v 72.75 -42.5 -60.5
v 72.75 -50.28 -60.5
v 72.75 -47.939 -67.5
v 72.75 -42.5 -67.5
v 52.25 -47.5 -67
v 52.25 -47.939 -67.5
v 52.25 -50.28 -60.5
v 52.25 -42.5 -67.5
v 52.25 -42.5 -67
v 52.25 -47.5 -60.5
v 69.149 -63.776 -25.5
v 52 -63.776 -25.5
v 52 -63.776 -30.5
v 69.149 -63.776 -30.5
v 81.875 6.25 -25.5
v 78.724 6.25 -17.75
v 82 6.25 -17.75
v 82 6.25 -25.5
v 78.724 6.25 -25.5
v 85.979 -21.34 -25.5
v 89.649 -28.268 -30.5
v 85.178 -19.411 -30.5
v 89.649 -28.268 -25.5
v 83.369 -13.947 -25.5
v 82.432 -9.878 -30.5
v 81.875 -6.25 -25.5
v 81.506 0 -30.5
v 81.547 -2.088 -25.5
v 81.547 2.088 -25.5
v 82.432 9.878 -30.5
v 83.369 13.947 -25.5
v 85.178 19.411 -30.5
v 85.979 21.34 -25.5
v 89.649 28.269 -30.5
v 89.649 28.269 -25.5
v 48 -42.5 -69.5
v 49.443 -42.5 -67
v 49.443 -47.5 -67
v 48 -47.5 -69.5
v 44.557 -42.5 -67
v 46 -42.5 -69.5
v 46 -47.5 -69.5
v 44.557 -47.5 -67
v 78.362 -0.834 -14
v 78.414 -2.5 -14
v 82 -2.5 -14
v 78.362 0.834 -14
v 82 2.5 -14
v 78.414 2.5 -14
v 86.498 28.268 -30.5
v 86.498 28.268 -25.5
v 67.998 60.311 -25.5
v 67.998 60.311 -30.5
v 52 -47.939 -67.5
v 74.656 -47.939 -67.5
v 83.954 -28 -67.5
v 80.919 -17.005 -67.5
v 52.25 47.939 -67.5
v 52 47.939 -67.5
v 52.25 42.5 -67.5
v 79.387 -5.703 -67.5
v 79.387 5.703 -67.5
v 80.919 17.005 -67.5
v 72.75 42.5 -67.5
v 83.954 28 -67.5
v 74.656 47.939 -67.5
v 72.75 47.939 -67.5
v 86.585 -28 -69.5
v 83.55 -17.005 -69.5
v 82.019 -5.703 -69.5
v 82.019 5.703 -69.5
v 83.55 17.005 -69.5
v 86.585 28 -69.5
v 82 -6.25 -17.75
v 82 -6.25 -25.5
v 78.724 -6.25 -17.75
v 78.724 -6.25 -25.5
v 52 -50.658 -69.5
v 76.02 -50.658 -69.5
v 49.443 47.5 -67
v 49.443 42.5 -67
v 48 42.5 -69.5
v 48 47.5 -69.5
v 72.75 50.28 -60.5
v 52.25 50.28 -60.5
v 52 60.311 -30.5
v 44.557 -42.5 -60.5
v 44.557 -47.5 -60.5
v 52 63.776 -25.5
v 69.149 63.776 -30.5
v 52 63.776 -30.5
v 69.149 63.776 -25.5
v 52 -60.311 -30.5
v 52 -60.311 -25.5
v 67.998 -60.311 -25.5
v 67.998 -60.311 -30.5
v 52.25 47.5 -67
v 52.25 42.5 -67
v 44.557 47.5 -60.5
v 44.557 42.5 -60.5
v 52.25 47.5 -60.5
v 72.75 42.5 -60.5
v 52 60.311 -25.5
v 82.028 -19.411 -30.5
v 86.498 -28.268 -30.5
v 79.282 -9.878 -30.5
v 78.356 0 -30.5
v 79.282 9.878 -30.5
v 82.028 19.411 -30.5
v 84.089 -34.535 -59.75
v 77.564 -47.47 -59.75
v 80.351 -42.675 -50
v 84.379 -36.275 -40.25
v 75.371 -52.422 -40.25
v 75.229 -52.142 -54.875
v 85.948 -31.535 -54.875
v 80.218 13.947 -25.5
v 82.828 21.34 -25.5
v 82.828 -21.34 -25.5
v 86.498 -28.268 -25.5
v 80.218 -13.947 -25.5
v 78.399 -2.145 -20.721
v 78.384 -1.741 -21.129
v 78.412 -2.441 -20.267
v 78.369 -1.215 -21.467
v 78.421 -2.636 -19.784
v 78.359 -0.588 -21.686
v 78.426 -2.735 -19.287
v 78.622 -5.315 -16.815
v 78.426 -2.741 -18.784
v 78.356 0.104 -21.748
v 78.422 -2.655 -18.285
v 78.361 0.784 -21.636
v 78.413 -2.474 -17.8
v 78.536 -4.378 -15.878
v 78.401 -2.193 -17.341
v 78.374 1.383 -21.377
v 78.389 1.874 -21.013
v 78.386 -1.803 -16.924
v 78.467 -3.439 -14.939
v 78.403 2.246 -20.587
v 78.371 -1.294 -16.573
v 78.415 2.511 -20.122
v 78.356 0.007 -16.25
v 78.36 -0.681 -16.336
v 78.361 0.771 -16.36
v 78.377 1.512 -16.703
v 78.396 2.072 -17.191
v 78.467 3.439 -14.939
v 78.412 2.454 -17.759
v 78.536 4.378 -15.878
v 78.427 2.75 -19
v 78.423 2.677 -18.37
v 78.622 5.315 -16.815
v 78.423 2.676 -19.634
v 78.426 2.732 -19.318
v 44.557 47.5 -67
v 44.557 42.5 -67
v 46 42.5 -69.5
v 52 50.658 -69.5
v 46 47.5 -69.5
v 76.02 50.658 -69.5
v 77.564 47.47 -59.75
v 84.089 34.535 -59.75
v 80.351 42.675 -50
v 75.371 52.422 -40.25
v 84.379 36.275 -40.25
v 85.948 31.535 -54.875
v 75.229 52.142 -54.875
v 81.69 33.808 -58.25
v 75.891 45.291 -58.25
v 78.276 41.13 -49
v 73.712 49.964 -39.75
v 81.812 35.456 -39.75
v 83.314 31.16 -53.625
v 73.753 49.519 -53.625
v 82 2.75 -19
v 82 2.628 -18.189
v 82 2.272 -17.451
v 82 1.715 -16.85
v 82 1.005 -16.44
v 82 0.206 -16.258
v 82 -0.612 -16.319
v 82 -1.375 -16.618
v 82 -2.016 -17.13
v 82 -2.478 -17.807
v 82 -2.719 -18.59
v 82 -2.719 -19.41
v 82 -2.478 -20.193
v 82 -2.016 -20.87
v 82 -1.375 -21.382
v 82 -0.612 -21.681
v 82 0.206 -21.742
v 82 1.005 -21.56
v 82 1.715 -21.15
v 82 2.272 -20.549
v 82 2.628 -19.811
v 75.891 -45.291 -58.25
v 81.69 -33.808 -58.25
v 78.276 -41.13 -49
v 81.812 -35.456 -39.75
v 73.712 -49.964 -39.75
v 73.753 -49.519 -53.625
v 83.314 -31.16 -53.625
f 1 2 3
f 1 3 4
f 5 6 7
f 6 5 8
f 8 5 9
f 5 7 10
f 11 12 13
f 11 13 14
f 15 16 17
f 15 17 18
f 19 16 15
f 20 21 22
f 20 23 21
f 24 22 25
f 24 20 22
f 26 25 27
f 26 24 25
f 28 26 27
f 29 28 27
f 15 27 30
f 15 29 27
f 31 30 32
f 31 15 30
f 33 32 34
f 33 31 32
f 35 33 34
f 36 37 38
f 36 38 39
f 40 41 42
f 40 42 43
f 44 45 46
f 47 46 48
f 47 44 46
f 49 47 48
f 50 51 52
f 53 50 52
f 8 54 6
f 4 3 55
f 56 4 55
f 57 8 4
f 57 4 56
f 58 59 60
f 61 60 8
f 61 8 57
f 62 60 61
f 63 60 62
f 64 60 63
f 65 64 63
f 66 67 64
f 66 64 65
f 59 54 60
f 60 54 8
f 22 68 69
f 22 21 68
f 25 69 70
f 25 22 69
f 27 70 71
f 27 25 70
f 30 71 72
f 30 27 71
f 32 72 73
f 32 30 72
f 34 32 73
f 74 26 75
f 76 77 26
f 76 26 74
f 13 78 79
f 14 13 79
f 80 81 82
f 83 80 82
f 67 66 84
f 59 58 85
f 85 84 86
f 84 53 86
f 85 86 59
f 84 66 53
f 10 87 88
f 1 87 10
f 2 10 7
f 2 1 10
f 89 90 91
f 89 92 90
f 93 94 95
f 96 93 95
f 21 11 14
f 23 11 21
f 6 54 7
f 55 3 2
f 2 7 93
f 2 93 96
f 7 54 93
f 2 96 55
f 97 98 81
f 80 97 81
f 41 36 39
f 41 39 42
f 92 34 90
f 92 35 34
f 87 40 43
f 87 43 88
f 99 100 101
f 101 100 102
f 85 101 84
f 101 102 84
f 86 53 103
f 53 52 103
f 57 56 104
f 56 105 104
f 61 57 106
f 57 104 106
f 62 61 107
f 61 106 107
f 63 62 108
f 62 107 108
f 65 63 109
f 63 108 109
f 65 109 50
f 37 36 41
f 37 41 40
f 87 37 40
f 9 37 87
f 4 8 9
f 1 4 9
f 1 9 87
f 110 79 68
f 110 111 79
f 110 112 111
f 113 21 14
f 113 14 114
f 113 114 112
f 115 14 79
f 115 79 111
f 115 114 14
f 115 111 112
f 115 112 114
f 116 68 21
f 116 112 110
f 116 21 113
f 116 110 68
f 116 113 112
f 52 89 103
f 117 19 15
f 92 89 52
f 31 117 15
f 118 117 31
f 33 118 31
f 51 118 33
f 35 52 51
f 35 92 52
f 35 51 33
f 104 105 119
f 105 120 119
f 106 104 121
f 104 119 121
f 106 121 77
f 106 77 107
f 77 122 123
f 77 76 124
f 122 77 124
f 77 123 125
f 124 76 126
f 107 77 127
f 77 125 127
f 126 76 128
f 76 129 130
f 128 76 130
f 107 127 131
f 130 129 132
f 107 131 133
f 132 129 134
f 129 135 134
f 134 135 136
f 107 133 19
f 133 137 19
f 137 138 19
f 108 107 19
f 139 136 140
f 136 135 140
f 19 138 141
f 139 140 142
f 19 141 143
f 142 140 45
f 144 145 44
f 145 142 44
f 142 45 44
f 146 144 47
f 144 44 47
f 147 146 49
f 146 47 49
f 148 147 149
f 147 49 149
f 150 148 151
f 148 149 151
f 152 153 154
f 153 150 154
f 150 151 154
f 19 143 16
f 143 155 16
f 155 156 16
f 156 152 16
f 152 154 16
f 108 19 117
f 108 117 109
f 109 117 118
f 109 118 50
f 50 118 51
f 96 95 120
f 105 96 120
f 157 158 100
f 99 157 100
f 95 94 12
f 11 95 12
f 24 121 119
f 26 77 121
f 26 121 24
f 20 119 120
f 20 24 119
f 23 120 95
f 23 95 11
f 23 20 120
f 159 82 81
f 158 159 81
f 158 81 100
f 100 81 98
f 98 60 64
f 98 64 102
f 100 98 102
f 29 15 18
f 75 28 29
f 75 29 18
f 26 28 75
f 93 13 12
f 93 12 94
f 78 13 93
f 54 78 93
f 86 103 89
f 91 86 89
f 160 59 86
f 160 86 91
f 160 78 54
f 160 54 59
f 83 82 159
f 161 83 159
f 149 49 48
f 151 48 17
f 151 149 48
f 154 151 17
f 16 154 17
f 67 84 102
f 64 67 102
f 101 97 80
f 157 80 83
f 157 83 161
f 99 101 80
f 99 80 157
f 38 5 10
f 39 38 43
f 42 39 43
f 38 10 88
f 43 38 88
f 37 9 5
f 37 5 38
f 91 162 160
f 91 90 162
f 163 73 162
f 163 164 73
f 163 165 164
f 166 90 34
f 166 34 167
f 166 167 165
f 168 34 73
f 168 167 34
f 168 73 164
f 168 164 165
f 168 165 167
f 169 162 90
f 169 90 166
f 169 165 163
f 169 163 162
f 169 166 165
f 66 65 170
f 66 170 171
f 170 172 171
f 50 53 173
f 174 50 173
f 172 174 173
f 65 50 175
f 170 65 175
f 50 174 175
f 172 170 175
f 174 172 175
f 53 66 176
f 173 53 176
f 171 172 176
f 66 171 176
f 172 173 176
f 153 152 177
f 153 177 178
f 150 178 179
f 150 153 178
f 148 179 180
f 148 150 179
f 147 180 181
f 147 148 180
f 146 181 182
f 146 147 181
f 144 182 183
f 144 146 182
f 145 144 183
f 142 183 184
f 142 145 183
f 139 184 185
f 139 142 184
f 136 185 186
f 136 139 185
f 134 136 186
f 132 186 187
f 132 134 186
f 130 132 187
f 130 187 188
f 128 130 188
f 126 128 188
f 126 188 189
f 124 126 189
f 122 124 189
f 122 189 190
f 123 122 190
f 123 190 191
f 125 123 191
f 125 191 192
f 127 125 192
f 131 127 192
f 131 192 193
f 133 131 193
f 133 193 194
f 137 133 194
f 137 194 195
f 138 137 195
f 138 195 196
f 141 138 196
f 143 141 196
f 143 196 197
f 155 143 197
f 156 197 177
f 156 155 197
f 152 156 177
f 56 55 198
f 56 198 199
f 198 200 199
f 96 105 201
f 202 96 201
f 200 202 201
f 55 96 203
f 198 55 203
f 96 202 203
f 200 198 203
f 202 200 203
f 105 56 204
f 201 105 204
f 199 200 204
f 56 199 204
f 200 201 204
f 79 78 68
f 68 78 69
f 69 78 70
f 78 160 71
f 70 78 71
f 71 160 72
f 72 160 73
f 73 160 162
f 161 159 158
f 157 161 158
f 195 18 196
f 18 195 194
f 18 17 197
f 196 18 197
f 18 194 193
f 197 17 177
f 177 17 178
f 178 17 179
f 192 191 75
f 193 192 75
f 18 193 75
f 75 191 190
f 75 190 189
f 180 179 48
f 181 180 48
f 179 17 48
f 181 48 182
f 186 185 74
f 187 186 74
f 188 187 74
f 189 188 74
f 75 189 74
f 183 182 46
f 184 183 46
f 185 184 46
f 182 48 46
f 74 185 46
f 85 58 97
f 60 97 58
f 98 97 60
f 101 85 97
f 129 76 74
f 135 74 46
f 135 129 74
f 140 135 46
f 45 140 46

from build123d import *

# Parameters (mm, degrees)
EXTRUDE136140_DEPTH = 5
BOX017_W            = 41
BOX017_H            = 140
BOX017_DEPTH        = 60
SKETCH348_R         = 1.85
EXTRUDE136129_DEPTH = 25
EXTRUDE136133_DEPTH = 6
EXTRUDE136132_DEPTH = 6
SKETCH339_R         = 1.75
EXTRUDE136134_DEPTH = 14
EXTRUDE136135_DEPTH = 5
SKETCH349_R         = 2.85
EXTRUDE136130_DEPTH = 25
SKETCH353_R         = 2.75
EXTRUDE136137_DEPTH = 4
EXTRUDE136131_DEPTH = 116
EXTRUDE136138_DEPTH = 20.5
EXTRUDE136128_DEPTH = 8
EXTRUDE136127_DEPTH = 8
ARRAY032_COUNT      = 2
EXTRUDE136139_DEPTH = 5


with BuildPart() as extrude136140:
    # Sketch355 → Extrude136140 (new body)
    with BuildSketch(Plane.XZ):
        Polygon((0, 0), (-2, 0), (-3.443376, 2.5), (-3.443376, 9), (5.556624, 9), (5.556624, 2.5), (1.443376, 2.5), align=None)
    extrude(amount=-EXTRUDE136140_DEPTH)


with BuildPart() as extrude136140_1:
    # Extrude136140 placement: moved
    add(extrude136140.part.moved(Location((48, 42.5, -44))))


with BuildPart() as cube014:
    # Box017 → Box017 (new body)
    with BuildSketch(Plane(origin=(52, -70, -46), x_dir=(1, 0, 0), z_dir=(0, 0, 1))):
        with Locations((20.5, 70)):
            Rectangle(BOX017_W, BOX017_H)
    extrude(amount=BOX017_DEPTH)


with BuildPart() as extrude136129:
    # Sketch348 → Extrude136129 (new body)
    with BuildSketch(Plane.XY):
        with Locations((-40, 60)):
            Circle(SKETCH348_R)
        with Locations((40, 60)):
            Circle(SKETCH348_R)
        with Locations((40, -60)):
            Circle(SKETCH348_R)
        with Locations((-40, -60)):
            Circle(SKETCH348_R)
    extrude(amount=-EXTRUDE136129_DEPTH)


with BuildPart() as extrude136133:
    # Sketch351 → Extrude136133 (new body)
    with BuildSketch(Plane.XZ):
        Polygon((-4.05083, 4), (-1.25, 0), (1.25, 0), (4.05083, 4), align=None)
    extrude(amount=-EXTRUDE136133_DEPTH)


with BuildPart() as extrude136133_1:
    # Extrude136133 placement: moved
    add(extrude136133.part.moved(Location((0, 42, 0))))


with BuildPart() as fusion034004041077001011012:
    # Sketch351 → Extrude136132 (new body)
    with BuildSketch(Plane.XZ):
        Polygon((-4.05083, 4), (-1.25, 0), (1.25, 0), (4.05083, 4), align=None)
    extrude(amount=-EXTRUDE136132_DEPTH)


with BuildPart() as fusion034004041077001011012_1:
    # Extrude136132 placement: moved
    add(fusion034004041077001011012.part.moved(Location((0, -48, 0))))

    # Fusion034004041077001011012: union Extrude136133
    add(extrude136133_1.part)


with BuildPart() as fusion034004041077001011012_2:
    # Fusion034004041077001011012 placement: moved
    add(fusion034004041077001011012_1.part.moved(Location((47, 0, -44))))


with BuildPart() as extrude136134:
    # Sketch339 → Extrude136134 (new body)
    with BuildSketch(Plane.XY.offset(-32)):
        with Locations((-37.5, 46.5)):
            Circle(SKETCH339_R)
        with Locations((37.5, 46.5)):
            Circle(SKETCH339_R)
        with Locations((37.5, -46.5)):
            Circle(SKETCH339_R)
        with Locations((-37.5, -46.5)):
            Circle(SKETCH339_R)
    extrude(amount=-EXTRUDE136134_DEPTH)


with BuildPart() as extrude136135:
    # Sketch340 → Extrude136135 (new body)
    with BuildSketch(Plane.XY.offset(-39)):
        Polygon((39.125, -49.314583), (40.75, -46.5), (39.125, -43.685417), (35.875, -43.685417), (34.25, -46.5), (35.875, -49.314583), align=None)
        Polygon((39.125, 43.685417), (40.75, 46.5), (39.125, 49.314583), (35.875, 49.314583), (34.25, 46.5), (35.875, 43.685417), align=None)
        Polygon((-34.25, 46.5), (-35.875, 49.314583), (-39.125, 49.314583), (-40.75, 46.5), (-39.125, 43.685417), (-35.875, 43.685417), align=None)
        Polygon((-40.75, -46.5), (-39.125, -49.314583), (-35.875, -49.314583), (-34.25, -46.5), (-35.875, -43.685417), (-39.125, -43.685417), align=None)
    extrude(amount=EXTRUDE136135_DEPTH)


with BuildPart() as fusion034004041077001011011:
    # Sketch349 → Extrude136130 (new body)
    with BuildSketch(Plane.XY.offset(-8)):
        with Locations((-40, -60)):
            Circle(SKETCH349_R)
        with Locations((40, -60)):
            Circle(SKETCH349_R)
        with Locations((40, 60)):
            Circle(SKETCH349_R)
        with Locations((-40, 60)):
            Circle(SKETCH349_R)
    extrude(amount=-EXTRUDE136130_DEPTH)

    # Fusion034004041077001011011: union Extrude136129, Fusion034004041077001011012, Extrude136134, Extrude136135
    add(extrude136129.part)
    add(fusion034004041077001011012_2.part)
    add(extrude136134.part)
    add(extrude136135.part)


with BuildPart() as loft005:
    # Sketch344 → Loft005 section 0
    with BuildSketch(Plane.XY.offset(-42)):
        with BuildLine():
            Line((83.953856, 28), (74.656255, 47.938771))
            Line((-74.656255, 47.938771), (74.656255, 47.938771))
            Line((-74.656255, 47.938771), (-83.953856, 28))
            ThreePointArc((-83.953856, -28), (-79.195376, 0), (-83.953856, 28))
            Line((-83.953856, -28), (-74.656255, -47.938771))
            Line((-74.656255, -47.938771), (74.656255, -47.938771))
            Line((74.656255, -47.938771), (83.953856, -28))
            ThreePointArc((83.953856, 28), (79.195376, 0), (83.953856, -28))
        make_face()
    # Sketch345 → Loft005 section 1
    with BuildSketch(Plane.XY.offset(-5)):
        with BuildLine():
            Line((86.49793, 28.2685), (67.99793, 60.31144))
            Line((-67.99793, 60.31144), (67.99793, 60.31144))
            Line((-67.99793, 60.31144), (-86.49793, 28.2685))
            ThreePointArc((-86.49793, -28.2685), (-78.355592, 0), (-86.49793, 28.2685))
            Line((-86.49793, -28.2685), (-67.99793, -60.31144))
            Line((-67.99793, -60.31144), (67.99793, -60.31144))
            Line((67.99793, -60.31144), (86.49793, -28.2685))
            ThreePointArc((86.49793, 28.2685), (78.355592, 0), (86.49793, -28.2685))
        make_face()
    # Sketch343 → Loft005 section 2
    with BuildSketch(Plane.XY.offset(12)):
        with BuildLine():
            Line((86.49793, 28.2685), (67.99793, 60.31144))
            Line((-67.99793, 60.31144), (67.99793, 60.31144))
            Line((-67.99793, 60.31144), (-86.49793, 28.2685))
            ThreePointArc((-86.49793, -28.2685), (-78.355592, 0), (-86.49793, 28.2685))
            Line((-86.49793, -28.2685), (-67.99793, -60.31144))
            Line((-67.99793, -60.31144), (67.99793, -60.31144))
            Line((67.99793, -60.31144), (86.49793, -28.2685))
            ThreePointArc((86.49793, 28.2685), (78.355592, 0), (86.49793, -28.2685))
        make_face()
    loft(ruled=True)


with BuildPart() as extrude136137:
    # Sketch353 → Extrude136137 (new body)
    with BuildSketch(Plane.YZ):
        Polygon((-6.25, 0), (-6.25, 7.75), (-2.5, 11.5), (2.5, 11.5), (6.25, 7.75), (6.25, 0), align=None)
        with Locations((0, 6.5)):
            Circle(SKETCH353_R, mode=Mode.SUBTRACT)
    extrude(amount=EXTRUDE136137_DEPTH)


with BuildPart() as extrude136137_1:
    # Extrude136137 placement: moved
    add(extrude136137.part.moved(Location((78, 0, 0))))


with BuildPart() as cut009010006006006005025006:
    # Sketch342 → Loft006 section 0
    with BuildSketch(Plane.XY.offset(-44)):
        with BuildLine():
            Line((86.585218, 28), (76.019762, 50.657695))
            Line((-76.019762, 50.657695), (76.019762, 50.657695))
            Line((-76.019762, 50.657695), (-86.585218, 28))
            ThreePointArc((-86.585218, -28), (-81.826738, 0), (-86.585218, 28))
            Line((-86.585218, -28), (-76.019762, -50.657695))
            Line((-76.019762, -50.657695), (76.019762, -50.657695))
            Line((76.019762, -50.657695), (86.585218, -28))
            ThreePointArc((86.585218, 28), (81.826738, 0), (86.585218, -28))
        make_face()
    # Sketch346 → Loft006 section 1
    with BuildSketch(Plane.XY.offset(-5)):
        with BuildLine():
            Line((89.648714, 28.2685), (69.148714, 63.775542))
            Line((-69.148714, 63.775542), (69.148714, 63.775542))
            Line((-69.148714, 63.775542), (-89.648714, 28.2685))
            ThreePointArc((-89.648714, -28.2685), (-81.506376, 0), (-89.648714, 28.2685))
            Line((-89.648714, -28.2685), (-69.148714, -63.775542))
            Line((-69.148714, -63.775542), (69.148714, -63.775542))
            Line((69.148714, -63.775542), (89.648714, -28.2685))
            ThreePointArc((89.648714, 28.2685), (81.506376, 0), (89.648714, -28.2685))
        make_face()
    # Sketch341 → Loft006 section 2
    with BuildSketch(Plane.XY):
        with BuildLine():
            Line((89.648714, 28.2685), (69.148714, 63.775542))
            Line((-69.148714, 63.775542), (69.148714, 63.775542))
            Line((-69.148714, 63.775542), (-89.648714, 28.2685))
            ThreePointArc((-89.648714, -28.2685), (-81.506376, 0), (-89.648714, 28.2685))
            Line((-89.648714, -28.2685), (-69.148714, -63.775542))
            Line((-69.148714, -63.775542), (69.148714, -63.775542))
            Line((69.148714, -63.775542), (89.648714, -28.2685))
            ThreePointArc((89.648714, 28.2685), (81.506376, 0), (89.648714, -28.2685))
        make_face()
    loft(ruled=True)

    # Fusion034004041077001011013: union Extrude136137
    add(extrude136137_1.part)

    # Cut009010006006006005025006: cut Loft005
    add(loft005.part, mode=Mode.SUBTRACT)


with BuildPart() as extrude136131:
    # Sketch350 → Extrude136131 (new body)
    with BuildSketch(Plane.YZ):
        Polygon((-52.764154, 0), (-49.5, -7), (-42.5, -7), (-42.5, 0), align=None)
        Polygon((52.764154, 0), (49.5, -7), (42.5, -7), (42.5, 0), align=None)
        Polygon((-26, 0), (-23, 0), (-23, -7), (-30.041452, -7), align=None)
        Polygon((23, 0), (26, 0), (30.041452, -7), (23, -7), align=None)
    extrude(amount=EXTRUDE136131_DEPTH)


with BuildPart() as extrude136131_1:
    # Extrude136131 placement: moved
    add(extrude136131.part.moved(Location((-72.85, 0, -35))))


with BuildPart() as extrude136138:
    # Sketch354 → Extrude136138 (new body)
    with BuildSketch(Plane.YZ):
        Polygon((-52.764154, 0), (-49.5, -7), (-42.5, -7), (-42.5, 0), align=None)
        Polygon((52.764154, 0), (49.5, -7), (42.5, -7), (42.5, 0), align=None)
    extrude(amount=-EXTRUDE136138_DEPTH)


with BuildPart() as extrude136138_1:
    # Extrude136138 placement: moved
    add(extrude136138.part.moved(Location((72.75, 0, -35))))


with BuildPart() as extrude136128:
    # Sketch347 → Extrude136128 (new body)
    with BuildSketch(Plane.YZ):
        Polygon((0, 0), (0, -5), (7, -17.124356), (7, 0), align=None)
    extrude(amount=EXTRUDE136128_DEPTH)


with BuildPart() as extrude136128_1:
    # Extrude136128 placement: moved
    add(extrude136128.part.moved(Location((-44, -63, 0))))


with BuildPart() as common001:
    # Sketch347 → Extrude136127 (new body)
    with BuildSketch(Plane.YZ):
        Polygon((0, 0), (0, -5), (7, -17.124356), (7, 0), align=None)
    extrude(amount=EXTRUDE136127_DEPTH)


with BuildPart() as common001_1:
    # Extrude136127 placement: moved
    add(common001.part.moved(Location((36, -63, 0))))

    # Fusion034004041077001011010: union Extrude136128
    add(extrude136128_1.part)

    # Array032: Common001 ×2 about axis
    array032_axis = Axis((0, 0, 0), (0, 0, 1))


with BuildPart() as common001_2:
    add(common001_1.part)
    for i in range(1, ARRAY032_COUNT):
        add(common001_1.part.rotate(array032_axis, i * 360 / ARRAY032_COUNT))

    # Fusion034004041077001011014: union Cut009010006006006005025006, Extrude136131, Extrude136138
    add(cut009010006006006005025006.part)
    add(extrude136131_1.part)
    add(extrude136138_1.part)

    # Cut009010006006006005025007: cut Fusion034004041077001011011
    add(fusion034004041077001011011.part, mode=Mode.SUBTRACT)

    # Common001: intersect Cube014
    add(cube014.part, mode=Mode.INTERSECT)


with BuildPart() as batterycoverfusion44mm:
    # Sketch355 → Extrude136139 (new body)
    with BuildSketch(Plane.XZ):
        Polygon((0, 0), (-2, 0), (-3.443376, 2.5), (-3.443376, 9), (5.556624, 9), (5.556624, 2.5), (1.443376, 2.5), align=None)
    extrude(amount=EXTRUDE136139_DEPTH)


with BuildPart() as batterycoverfusion44mm_1:
    # Extrude136139 placement: moved
    add(batterycoverfusion44mm.part.moved(Location((48, -42.5, -44))))

    # Fusion034004041077001011015: union Extrude136140, Common001
    add(extrude136140_1.part)
    add(common001_2.part)


with BuildPart() as batterycoverfusion44mm_2:
    # Fusion034004041077001011015 placement: moved
    add(batterycoverfusion44mm_1.part.moved(Location((0, 0, -25.5))))


solid = batterycoverfusion44mm_2.part
